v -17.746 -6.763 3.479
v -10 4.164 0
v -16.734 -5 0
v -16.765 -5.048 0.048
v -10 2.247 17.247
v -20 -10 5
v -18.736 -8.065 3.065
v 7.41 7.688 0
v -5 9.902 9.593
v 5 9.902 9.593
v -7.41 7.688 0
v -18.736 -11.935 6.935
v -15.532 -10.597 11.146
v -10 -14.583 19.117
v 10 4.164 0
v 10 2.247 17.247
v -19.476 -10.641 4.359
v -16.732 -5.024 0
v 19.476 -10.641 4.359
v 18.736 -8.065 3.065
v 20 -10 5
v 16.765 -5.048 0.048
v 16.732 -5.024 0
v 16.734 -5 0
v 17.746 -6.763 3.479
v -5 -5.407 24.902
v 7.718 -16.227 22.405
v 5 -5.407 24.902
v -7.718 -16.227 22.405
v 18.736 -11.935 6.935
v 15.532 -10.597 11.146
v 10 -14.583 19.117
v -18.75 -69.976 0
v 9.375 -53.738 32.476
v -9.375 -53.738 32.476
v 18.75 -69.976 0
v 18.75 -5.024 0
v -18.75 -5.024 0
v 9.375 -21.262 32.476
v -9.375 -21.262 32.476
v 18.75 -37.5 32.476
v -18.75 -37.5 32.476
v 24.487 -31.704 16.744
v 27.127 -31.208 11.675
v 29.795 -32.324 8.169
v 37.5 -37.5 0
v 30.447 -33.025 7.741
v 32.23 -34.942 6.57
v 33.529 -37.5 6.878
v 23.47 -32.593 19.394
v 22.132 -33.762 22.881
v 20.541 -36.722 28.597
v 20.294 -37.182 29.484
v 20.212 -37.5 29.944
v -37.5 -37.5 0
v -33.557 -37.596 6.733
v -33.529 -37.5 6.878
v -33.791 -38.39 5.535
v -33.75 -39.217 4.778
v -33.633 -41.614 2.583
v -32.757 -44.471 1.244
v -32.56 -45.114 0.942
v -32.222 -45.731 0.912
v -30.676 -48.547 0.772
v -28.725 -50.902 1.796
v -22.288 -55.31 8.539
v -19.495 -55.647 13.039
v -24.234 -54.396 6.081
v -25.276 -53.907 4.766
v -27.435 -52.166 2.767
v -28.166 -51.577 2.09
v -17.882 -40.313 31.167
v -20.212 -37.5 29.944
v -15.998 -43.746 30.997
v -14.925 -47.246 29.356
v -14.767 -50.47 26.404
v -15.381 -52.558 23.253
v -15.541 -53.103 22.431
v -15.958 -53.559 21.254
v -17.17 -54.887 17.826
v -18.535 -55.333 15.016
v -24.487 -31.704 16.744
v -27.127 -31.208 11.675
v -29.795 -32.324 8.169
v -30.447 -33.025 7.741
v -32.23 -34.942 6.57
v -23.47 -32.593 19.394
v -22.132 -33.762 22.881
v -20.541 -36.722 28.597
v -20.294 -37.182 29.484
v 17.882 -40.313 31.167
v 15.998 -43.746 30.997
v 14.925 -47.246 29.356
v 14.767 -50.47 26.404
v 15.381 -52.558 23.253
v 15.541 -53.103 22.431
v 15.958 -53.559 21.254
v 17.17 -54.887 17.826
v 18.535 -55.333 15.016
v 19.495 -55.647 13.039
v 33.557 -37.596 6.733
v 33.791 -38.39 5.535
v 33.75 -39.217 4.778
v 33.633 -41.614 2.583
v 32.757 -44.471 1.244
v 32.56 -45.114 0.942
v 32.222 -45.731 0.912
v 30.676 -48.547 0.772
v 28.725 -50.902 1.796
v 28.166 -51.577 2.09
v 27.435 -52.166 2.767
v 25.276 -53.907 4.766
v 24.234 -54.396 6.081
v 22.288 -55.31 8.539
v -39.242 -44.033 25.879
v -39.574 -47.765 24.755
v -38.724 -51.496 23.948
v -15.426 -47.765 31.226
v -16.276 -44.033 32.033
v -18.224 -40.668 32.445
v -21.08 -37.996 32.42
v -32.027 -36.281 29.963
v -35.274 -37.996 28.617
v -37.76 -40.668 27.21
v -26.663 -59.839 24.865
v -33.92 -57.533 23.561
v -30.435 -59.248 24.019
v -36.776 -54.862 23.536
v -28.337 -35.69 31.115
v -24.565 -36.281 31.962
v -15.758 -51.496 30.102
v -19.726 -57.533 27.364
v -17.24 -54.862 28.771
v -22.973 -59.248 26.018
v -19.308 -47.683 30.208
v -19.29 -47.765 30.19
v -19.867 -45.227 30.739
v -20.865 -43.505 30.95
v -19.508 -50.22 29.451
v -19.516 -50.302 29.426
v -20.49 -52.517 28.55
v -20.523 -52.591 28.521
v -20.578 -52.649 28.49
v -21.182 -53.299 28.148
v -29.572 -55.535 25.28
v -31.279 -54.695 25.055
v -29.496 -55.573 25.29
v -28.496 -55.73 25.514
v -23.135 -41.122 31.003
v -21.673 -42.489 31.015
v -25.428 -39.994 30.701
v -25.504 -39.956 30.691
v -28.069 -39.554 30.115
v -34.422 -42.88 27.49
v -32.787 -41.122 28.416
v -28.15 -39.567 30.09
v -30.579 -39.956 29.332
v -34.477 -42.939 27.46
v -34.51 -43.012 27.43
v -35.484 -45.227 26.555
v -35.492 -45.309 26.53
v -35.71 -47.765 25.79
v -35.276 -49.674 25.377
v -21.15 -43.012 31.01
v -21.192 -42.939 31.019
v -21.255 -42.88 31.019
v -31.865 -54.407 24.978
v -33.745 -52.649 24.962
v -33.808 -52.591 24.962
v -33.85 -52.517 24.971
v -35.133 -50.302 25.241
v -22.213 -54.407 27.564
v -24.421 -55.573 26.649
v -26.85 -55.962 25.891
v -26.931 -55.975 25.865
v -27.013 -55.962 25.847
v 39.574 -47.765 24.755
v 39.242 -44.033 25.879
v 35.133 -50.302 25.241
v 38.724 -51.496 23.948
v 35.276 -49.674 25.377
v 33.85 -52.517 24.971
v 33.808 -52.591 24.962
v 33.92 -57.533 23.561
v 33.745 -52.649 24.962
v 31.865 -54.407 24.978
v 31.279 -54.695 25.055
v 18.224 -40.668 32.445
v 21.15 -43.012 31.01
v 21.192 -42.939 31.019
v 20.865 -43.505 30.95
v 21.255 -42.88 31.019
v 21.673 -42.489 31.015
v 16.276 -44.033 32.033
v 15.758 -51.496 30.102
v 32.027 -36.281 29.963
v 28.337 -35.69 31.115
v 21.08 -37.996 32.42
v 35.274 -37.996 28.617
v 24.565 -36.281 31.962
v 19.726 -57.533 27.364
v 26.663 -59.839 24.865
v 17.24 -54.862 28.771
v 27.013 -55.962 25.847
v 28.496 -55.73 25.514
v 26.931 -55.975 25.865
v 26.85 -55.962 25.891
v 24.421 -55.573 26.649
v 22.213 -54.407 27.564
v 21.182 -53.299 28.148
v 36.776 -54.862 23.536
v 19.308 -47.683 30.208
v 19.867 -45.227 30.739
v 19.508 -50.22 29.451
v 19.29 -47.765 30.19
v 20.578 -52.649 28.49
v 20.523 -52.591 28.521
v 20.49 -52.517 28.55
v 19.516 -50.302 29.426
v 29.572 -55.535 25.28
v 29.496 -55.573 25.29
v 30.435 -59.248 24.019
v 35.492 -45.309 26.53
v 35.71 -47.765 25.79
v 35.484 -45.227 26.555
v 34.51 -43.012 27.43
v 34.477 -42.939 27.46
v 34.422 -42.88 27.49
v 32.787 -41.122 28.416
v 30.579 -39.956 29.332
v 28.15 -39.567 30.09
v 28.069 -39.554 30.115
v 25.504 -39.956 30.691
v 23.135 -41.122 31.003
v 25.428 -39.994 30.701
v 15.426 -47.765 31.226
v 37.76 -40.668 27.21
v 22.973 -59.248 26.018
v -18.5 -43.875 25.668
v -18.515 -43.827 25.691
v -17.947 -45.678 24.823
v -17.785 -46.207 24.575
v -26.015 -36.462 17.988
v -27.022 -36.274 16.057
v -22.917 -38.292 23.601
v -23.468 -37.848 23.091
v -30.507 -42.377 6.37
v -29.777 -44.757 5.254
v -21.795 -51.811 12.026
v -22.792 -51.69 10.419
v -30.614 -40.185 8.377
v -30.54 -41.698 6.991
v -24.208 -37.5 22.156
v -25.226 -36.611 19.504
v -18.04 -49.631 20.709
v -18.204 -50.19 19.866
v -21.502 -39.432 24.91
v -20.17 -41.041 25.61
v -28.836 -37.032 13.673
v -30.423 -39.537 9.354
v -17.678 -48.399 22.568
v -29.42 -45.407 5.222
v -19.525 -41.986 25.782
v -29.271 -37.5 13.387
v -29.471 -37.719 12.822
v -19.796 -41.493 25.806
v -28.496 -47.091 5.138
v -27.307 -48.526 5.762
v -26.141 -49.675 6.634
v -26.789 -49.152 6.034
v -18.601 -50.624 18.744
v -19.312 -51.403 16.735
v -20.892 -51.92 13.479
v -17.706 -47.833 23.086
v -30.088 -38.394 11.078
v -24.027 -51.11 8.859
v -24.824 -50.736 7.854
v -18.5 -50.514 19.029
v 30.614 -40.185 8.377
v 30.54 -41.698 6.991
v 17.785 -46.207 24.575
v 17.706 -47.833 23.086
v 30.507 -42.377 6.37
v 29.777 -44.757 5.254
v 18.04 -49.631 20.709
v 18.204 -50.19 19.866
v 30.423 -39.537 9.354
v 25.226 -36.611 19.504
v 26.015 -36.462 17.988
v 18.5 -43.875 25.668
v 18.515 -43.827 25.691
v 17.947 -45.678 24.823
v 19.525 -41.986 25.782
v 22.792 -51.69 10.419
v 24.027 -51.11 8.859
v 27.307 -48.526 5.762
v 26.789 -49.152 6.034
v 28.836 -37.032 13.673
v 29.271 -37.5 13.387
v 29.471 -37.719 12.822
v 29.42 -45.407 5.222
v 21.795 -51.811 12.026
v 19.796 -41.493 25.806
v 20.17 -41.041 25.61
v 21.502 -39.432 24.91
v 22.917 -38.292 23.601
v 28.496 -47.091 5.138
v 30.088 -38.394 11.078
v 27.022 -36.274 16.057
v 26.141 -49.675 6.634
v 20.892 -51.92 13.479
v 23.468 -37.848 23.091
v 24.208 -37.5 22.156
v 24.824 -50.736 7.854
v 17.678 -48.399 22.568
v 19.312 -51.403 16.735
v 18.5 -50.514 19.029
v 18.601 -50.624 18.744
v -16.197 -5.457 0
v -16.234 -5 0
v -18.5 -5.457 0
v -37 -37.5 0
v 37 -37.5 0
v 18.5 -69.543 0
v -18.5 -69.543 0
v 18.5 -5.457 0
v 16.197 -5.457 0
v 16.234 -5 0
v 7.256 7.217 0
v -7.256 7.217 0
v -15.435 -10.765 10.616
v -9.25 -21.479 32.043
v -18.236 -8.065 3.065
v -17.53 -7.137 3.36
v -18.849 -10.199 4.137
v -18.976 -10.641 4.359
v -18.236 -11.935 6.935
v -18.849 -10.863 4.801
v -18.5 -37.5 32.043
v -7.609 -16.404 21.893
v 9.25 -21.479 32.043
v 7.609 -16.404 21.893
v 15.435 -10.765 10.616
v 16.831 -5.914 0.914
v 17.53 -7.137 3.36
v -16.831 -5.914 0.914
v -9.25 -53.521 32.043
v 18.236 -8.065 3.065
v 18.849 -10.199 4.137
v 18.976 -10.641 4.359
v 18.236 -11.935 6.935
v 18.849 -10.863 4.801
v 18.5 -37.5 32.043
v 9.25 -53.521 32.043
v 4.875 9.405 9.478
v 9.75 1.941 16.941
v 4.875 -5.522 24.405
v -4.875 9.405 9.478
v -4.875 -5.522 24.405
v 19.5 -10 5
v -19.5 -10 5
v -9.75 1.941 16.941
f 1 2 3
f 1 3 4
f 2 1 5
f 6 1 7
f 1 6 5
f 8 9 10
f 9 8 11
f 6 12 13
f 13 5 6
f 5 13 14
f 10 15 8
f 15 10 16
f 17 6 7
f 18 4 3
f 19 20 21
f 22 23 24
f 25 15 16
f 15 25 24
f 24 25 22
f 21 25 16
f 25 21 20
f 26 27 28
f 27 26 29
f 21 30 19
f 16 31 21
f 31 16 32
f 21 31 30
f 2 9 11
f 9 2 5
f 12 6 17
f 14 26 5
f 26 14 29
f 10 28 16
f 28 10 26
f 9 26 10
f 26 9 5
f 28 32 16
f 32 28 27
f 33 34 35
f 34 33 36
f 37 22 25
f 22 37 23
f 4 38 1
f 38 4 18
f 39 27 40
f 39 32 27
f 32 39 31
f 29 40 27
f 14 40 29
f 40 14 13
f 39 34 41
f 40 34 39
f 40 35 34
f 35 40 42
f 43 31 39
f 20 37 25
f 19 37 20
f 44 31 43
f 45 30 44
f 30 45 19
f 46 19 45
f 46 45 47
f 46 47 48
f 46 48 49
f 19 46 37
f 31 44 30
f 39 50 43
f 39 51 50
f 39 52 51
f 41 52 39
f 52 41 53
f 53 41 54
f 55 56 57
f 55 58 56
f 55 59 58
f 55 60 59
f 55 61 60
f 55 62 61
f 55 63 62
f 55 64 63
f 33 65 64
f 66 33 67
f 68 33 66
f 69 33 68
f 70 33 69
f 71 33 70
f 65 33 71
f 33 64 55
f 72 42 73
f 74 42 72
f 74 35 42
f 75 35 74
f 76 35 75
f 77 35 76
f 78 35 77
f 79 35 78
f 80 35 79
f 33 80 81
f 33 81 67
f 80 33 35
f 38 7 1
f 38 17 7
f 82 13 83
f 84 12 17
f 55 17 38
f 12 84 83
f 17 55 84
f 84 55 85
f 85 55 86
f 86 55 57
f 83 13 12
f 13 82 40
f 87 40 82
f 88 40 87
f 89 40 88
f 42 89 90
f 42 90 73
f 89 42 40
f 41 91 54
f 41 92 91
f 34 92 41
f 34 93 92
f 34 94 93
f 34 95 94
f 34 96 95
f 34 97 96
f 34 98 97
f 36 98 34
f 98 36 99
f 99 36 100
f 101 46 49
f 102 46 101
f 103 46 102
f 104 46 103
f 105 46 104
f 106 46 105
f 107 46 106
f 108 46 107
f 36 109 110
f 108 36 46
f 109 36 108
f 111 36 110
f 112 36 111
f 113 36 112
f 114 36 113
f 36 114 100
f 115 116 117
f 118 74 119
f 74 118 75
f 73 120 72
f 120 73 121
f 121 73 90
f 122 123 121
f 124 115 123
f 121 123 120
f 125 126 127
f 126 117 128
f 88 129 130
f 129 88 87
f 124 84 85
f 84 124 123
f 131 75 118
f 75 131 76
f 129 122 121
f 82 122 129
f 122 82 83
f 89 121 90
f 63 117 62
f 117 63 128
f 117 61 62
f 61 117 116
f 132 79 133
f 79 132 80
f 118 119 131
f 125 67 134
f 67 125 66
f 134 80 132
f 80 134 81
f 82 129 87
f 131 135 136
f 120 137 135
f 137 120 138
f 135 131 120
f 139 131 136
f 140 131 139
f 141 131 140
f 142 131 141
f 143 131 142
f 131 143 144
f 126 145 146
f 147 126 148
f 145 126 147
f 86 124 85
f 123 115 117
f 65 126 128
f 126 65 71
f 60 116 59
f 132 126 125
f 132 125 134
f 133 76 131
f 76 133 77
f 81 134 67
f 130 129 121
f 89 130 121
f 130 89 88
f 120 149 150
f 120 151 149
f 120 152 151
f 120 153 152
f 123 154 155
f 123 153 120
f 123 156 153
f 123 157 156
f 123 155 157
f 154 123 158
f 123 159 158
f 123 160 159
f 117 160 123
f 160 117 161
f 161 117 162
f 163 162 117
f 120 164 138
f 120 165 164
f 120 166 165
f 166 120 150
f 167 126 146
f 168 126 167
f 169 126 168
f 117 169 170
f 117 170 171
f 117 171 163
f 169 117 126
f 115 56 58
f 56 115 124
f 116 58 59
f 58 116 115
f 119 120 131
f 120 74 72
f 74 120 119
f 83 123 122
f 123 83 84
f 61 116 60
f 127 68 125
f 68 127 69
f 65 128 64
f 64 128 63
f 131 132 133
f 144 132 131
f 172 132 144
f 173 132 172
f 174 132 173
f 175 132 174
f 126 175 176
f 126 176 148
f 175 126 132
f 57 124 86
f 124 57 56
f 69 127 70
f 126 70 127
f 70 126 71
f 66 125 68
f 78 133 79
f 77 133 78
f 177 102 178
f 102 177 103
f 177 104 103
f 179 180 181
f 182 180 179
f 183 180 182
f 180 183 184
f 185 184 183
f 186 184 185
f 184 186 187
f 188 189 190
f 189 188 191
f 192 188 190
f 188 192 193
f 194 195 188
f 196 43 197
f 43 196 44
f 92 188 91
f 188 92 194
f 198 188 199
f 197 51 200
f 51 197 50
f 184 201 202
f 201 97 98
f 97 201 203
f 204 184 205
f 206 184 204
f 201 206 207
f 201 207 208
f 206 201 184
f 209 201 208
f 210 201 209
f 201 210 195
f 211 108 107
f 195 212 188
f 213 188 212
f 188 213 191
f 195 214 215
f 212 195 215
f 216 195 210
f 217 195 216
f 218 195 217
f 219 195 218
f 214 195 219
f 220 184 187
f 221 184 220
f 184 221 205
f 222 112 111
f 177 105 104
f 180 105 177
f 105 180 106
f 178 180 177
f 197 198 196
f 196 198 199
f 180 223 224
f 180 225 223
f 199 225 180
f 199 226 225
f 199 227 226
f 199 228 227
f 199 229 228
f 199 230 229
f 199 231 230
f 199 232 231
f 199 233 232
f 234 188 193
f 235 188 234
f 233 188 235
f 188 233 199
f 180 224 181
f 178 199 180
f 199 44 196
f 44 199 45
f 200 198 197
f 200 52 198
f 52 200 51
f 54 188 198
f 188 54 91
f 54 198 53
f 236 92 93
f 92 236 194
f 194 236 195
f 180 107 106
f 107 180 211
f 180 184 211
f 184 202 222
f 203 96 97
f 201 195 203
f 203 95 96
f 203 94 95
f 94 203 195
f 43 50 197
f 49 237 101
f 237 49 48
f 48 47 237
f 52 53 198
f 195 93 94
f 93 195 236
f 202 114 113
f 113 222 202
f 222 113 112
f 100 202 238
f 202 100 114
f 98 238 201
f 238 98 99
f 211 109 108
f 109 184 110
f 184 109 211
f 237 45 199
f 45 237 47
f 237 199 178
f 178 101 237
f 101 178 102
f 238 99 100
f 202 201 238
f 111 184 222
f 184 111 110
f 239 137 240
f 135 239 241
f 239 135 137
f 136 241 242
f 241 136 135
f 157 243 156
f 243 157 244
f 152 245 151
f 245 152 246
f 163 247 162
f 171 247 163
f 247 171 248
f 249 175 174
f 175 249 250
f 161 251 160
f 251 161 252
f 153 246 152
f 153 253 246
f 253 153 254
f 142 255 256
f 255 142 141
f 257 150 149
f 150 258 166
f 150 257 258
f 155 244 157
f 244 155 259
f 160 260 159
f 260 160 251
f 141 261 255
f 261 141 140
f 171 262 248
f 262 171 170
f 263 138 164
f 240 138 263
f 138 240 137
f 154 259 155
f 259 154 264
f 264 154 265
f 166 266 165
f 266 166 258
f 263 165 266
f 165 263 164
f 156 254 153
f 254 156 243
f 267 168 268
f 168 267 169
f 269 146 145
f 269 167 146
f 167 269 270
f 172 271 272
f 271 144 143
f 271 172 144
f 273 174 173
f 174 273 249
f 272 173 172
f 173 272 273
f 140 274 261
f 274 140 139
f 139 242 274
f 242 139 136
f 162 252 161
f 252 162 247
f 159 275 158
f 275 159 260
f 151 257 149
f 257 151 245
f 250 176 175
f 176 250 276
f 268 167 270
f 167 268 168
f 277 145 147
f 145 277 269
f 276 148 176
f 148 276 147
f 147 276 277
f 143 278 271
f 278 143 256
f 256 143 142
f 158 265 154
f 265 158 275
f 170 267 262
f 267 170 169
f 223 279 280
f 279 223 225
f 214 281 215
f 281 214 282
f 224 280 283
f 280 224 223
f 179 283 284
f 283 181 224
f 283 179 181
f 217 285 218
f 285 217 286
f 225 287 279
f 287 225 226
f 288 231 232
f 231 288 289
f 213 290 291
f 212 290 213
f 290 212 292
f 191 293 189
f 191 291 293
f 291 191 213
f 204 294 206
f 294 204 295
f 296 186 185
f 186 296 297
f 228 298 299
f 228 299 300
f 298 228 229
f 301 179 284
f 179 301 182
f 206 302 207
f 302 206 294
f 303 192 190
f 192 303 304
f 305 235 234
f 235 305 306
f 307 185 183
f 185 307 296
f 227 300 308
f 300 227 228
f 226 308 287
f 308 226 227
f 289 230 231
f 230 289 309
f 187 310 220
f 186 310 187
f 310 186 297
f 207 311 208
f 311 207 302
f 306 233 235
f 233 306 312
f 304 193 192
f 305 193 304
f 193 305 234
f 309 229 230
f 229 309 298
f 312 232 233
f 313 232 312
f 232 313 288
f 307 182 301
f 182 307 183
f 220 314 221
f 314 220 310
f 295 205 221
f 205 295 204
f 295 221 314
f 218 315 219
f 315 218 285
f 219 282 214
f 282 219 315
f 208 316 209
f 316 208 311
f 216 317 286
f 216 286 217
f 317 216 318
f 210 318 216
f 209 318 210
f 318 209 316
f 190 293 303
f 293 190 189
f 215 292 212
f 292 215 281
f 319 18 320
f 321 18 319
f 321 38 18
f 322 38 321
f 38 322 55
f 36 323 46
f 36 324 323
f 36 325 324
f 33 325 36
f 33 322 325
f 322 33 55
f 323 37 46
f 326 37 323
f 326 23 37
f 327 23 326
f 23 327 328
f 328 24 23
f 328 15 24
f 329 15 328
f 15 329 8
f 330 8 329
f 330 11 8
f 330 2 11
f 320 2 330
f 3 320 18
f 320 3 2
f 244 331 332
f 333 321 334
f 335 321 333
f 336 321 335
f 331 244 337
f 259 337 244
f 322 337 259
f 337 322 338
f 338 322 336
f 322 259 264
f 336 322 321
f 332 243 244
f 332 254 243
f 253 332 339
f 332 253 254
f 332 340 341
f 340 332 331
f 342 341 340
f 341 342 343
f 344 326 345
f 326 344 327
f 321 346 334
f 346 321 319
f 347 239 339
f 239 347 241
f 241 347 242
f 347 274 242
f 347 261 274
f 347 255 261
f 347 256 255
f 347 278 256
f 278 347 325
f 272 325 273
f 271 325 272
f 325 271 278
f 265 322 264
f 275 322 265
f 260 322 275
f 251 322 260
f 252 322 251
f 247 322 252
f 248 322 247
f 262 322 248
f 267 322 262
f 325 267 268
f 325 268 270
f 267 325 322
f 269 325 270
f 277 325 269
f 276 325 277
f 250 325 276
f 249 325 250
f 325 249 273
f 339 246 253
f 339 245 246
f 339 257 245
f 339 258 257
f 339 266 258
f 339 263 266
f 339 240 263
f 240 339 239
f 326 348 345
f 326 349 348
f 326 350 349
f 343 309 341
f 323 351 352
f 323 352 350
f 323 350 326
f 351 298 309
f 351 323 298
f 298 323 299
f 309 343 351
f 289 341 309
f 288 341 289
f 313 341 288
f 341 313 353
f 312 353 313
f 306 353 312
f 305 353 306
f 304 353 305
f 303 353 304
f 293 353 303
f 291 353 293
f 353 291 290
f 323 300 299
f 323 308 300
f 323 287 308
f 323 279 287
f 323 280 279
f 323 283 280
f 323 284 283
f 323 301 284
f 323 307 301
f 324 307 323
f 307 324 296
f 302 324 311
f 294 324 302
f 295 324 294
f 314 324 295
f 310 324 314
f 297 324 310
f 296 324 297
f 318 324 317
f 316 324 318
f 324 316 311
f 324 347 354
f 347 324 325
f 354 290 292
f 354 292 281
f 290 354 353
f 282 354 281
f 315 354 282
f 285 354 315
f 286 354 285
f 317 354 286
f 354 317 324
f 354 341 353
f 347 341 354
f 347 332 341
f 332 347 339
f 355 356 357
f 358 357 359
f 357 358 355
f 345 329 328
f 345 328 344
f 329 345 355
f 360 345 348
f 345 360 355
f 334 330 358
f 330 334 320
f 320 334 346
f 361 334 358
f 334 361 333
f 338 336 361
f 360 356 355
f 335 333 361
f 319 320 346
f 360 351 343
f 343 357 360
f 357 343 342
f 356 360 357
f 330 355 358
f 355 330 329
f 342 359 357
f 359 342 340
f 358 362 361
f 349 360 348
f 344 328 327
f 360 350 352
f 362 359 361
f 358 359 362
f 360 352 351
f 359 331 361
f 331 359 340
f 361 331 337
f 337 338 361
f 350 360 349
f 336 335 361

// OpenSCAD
$fn=6;

difference() {
    union() {
        main_mask();
        tubes();
    }
    all_cutouts();
}

module tubes() {
    difference() {
        union() {
            translate([-20,-40,0]) rotate([15,-15,0]) cylinder($fn=20, d=25, h=30);
            translate([20,-40,0]) rotate([15,15,0]) cylinder($fn=20, d=25, h=30);
        }
    }
}

module tubes_cutout() {
    translate([-20,-40,0]) rotate([15,-15,0]) cylinder($fn=20, d=25-8, h=31);
    translate([20,-40,0]) rotate([15,15,0]) cylinder($fn=20, d=25-8, h=31);
}

module all_cutouts() {
    tubes_cutout();
    mask_cutout();
}

module main_mask() {
    difference () {
        union() {
            translate([0,-10,5]) rotate([-45,0,0]) scale([1,1.25,1])
                hollow_sphere(40, hollow=1, thickness=1.6);

            translate([0,-37.5,0])
                hollow_sphere(hollow=1, thickness=1.6);
        }
        //translate([0,-37,0]) cylinder(d=37,h=100);
    }
}

module mask_cutout() {    
    translate([-200/2,-200/2,-200]) cube(200);
    translate([0,-37.5,0])
        hollow_sphere(diam=74, hollow=0);
    translate([0,-10,5]) rotate([-45,0,0]) scale([1,1.25,1])
        hollow_sphere(39, hollow=0);
}
//scale([1.4,1.4,1.4]) 

module hollow_sphere(diam=75, thickness=1, half=0, hollow=0) {
    difference() {
        sphere(d=diam);
        if (hollow) sphere(d=diam-thickness);
        if (half) translate([-diam/2,-diam/2,-diam]) cube(diam);
    }
}
